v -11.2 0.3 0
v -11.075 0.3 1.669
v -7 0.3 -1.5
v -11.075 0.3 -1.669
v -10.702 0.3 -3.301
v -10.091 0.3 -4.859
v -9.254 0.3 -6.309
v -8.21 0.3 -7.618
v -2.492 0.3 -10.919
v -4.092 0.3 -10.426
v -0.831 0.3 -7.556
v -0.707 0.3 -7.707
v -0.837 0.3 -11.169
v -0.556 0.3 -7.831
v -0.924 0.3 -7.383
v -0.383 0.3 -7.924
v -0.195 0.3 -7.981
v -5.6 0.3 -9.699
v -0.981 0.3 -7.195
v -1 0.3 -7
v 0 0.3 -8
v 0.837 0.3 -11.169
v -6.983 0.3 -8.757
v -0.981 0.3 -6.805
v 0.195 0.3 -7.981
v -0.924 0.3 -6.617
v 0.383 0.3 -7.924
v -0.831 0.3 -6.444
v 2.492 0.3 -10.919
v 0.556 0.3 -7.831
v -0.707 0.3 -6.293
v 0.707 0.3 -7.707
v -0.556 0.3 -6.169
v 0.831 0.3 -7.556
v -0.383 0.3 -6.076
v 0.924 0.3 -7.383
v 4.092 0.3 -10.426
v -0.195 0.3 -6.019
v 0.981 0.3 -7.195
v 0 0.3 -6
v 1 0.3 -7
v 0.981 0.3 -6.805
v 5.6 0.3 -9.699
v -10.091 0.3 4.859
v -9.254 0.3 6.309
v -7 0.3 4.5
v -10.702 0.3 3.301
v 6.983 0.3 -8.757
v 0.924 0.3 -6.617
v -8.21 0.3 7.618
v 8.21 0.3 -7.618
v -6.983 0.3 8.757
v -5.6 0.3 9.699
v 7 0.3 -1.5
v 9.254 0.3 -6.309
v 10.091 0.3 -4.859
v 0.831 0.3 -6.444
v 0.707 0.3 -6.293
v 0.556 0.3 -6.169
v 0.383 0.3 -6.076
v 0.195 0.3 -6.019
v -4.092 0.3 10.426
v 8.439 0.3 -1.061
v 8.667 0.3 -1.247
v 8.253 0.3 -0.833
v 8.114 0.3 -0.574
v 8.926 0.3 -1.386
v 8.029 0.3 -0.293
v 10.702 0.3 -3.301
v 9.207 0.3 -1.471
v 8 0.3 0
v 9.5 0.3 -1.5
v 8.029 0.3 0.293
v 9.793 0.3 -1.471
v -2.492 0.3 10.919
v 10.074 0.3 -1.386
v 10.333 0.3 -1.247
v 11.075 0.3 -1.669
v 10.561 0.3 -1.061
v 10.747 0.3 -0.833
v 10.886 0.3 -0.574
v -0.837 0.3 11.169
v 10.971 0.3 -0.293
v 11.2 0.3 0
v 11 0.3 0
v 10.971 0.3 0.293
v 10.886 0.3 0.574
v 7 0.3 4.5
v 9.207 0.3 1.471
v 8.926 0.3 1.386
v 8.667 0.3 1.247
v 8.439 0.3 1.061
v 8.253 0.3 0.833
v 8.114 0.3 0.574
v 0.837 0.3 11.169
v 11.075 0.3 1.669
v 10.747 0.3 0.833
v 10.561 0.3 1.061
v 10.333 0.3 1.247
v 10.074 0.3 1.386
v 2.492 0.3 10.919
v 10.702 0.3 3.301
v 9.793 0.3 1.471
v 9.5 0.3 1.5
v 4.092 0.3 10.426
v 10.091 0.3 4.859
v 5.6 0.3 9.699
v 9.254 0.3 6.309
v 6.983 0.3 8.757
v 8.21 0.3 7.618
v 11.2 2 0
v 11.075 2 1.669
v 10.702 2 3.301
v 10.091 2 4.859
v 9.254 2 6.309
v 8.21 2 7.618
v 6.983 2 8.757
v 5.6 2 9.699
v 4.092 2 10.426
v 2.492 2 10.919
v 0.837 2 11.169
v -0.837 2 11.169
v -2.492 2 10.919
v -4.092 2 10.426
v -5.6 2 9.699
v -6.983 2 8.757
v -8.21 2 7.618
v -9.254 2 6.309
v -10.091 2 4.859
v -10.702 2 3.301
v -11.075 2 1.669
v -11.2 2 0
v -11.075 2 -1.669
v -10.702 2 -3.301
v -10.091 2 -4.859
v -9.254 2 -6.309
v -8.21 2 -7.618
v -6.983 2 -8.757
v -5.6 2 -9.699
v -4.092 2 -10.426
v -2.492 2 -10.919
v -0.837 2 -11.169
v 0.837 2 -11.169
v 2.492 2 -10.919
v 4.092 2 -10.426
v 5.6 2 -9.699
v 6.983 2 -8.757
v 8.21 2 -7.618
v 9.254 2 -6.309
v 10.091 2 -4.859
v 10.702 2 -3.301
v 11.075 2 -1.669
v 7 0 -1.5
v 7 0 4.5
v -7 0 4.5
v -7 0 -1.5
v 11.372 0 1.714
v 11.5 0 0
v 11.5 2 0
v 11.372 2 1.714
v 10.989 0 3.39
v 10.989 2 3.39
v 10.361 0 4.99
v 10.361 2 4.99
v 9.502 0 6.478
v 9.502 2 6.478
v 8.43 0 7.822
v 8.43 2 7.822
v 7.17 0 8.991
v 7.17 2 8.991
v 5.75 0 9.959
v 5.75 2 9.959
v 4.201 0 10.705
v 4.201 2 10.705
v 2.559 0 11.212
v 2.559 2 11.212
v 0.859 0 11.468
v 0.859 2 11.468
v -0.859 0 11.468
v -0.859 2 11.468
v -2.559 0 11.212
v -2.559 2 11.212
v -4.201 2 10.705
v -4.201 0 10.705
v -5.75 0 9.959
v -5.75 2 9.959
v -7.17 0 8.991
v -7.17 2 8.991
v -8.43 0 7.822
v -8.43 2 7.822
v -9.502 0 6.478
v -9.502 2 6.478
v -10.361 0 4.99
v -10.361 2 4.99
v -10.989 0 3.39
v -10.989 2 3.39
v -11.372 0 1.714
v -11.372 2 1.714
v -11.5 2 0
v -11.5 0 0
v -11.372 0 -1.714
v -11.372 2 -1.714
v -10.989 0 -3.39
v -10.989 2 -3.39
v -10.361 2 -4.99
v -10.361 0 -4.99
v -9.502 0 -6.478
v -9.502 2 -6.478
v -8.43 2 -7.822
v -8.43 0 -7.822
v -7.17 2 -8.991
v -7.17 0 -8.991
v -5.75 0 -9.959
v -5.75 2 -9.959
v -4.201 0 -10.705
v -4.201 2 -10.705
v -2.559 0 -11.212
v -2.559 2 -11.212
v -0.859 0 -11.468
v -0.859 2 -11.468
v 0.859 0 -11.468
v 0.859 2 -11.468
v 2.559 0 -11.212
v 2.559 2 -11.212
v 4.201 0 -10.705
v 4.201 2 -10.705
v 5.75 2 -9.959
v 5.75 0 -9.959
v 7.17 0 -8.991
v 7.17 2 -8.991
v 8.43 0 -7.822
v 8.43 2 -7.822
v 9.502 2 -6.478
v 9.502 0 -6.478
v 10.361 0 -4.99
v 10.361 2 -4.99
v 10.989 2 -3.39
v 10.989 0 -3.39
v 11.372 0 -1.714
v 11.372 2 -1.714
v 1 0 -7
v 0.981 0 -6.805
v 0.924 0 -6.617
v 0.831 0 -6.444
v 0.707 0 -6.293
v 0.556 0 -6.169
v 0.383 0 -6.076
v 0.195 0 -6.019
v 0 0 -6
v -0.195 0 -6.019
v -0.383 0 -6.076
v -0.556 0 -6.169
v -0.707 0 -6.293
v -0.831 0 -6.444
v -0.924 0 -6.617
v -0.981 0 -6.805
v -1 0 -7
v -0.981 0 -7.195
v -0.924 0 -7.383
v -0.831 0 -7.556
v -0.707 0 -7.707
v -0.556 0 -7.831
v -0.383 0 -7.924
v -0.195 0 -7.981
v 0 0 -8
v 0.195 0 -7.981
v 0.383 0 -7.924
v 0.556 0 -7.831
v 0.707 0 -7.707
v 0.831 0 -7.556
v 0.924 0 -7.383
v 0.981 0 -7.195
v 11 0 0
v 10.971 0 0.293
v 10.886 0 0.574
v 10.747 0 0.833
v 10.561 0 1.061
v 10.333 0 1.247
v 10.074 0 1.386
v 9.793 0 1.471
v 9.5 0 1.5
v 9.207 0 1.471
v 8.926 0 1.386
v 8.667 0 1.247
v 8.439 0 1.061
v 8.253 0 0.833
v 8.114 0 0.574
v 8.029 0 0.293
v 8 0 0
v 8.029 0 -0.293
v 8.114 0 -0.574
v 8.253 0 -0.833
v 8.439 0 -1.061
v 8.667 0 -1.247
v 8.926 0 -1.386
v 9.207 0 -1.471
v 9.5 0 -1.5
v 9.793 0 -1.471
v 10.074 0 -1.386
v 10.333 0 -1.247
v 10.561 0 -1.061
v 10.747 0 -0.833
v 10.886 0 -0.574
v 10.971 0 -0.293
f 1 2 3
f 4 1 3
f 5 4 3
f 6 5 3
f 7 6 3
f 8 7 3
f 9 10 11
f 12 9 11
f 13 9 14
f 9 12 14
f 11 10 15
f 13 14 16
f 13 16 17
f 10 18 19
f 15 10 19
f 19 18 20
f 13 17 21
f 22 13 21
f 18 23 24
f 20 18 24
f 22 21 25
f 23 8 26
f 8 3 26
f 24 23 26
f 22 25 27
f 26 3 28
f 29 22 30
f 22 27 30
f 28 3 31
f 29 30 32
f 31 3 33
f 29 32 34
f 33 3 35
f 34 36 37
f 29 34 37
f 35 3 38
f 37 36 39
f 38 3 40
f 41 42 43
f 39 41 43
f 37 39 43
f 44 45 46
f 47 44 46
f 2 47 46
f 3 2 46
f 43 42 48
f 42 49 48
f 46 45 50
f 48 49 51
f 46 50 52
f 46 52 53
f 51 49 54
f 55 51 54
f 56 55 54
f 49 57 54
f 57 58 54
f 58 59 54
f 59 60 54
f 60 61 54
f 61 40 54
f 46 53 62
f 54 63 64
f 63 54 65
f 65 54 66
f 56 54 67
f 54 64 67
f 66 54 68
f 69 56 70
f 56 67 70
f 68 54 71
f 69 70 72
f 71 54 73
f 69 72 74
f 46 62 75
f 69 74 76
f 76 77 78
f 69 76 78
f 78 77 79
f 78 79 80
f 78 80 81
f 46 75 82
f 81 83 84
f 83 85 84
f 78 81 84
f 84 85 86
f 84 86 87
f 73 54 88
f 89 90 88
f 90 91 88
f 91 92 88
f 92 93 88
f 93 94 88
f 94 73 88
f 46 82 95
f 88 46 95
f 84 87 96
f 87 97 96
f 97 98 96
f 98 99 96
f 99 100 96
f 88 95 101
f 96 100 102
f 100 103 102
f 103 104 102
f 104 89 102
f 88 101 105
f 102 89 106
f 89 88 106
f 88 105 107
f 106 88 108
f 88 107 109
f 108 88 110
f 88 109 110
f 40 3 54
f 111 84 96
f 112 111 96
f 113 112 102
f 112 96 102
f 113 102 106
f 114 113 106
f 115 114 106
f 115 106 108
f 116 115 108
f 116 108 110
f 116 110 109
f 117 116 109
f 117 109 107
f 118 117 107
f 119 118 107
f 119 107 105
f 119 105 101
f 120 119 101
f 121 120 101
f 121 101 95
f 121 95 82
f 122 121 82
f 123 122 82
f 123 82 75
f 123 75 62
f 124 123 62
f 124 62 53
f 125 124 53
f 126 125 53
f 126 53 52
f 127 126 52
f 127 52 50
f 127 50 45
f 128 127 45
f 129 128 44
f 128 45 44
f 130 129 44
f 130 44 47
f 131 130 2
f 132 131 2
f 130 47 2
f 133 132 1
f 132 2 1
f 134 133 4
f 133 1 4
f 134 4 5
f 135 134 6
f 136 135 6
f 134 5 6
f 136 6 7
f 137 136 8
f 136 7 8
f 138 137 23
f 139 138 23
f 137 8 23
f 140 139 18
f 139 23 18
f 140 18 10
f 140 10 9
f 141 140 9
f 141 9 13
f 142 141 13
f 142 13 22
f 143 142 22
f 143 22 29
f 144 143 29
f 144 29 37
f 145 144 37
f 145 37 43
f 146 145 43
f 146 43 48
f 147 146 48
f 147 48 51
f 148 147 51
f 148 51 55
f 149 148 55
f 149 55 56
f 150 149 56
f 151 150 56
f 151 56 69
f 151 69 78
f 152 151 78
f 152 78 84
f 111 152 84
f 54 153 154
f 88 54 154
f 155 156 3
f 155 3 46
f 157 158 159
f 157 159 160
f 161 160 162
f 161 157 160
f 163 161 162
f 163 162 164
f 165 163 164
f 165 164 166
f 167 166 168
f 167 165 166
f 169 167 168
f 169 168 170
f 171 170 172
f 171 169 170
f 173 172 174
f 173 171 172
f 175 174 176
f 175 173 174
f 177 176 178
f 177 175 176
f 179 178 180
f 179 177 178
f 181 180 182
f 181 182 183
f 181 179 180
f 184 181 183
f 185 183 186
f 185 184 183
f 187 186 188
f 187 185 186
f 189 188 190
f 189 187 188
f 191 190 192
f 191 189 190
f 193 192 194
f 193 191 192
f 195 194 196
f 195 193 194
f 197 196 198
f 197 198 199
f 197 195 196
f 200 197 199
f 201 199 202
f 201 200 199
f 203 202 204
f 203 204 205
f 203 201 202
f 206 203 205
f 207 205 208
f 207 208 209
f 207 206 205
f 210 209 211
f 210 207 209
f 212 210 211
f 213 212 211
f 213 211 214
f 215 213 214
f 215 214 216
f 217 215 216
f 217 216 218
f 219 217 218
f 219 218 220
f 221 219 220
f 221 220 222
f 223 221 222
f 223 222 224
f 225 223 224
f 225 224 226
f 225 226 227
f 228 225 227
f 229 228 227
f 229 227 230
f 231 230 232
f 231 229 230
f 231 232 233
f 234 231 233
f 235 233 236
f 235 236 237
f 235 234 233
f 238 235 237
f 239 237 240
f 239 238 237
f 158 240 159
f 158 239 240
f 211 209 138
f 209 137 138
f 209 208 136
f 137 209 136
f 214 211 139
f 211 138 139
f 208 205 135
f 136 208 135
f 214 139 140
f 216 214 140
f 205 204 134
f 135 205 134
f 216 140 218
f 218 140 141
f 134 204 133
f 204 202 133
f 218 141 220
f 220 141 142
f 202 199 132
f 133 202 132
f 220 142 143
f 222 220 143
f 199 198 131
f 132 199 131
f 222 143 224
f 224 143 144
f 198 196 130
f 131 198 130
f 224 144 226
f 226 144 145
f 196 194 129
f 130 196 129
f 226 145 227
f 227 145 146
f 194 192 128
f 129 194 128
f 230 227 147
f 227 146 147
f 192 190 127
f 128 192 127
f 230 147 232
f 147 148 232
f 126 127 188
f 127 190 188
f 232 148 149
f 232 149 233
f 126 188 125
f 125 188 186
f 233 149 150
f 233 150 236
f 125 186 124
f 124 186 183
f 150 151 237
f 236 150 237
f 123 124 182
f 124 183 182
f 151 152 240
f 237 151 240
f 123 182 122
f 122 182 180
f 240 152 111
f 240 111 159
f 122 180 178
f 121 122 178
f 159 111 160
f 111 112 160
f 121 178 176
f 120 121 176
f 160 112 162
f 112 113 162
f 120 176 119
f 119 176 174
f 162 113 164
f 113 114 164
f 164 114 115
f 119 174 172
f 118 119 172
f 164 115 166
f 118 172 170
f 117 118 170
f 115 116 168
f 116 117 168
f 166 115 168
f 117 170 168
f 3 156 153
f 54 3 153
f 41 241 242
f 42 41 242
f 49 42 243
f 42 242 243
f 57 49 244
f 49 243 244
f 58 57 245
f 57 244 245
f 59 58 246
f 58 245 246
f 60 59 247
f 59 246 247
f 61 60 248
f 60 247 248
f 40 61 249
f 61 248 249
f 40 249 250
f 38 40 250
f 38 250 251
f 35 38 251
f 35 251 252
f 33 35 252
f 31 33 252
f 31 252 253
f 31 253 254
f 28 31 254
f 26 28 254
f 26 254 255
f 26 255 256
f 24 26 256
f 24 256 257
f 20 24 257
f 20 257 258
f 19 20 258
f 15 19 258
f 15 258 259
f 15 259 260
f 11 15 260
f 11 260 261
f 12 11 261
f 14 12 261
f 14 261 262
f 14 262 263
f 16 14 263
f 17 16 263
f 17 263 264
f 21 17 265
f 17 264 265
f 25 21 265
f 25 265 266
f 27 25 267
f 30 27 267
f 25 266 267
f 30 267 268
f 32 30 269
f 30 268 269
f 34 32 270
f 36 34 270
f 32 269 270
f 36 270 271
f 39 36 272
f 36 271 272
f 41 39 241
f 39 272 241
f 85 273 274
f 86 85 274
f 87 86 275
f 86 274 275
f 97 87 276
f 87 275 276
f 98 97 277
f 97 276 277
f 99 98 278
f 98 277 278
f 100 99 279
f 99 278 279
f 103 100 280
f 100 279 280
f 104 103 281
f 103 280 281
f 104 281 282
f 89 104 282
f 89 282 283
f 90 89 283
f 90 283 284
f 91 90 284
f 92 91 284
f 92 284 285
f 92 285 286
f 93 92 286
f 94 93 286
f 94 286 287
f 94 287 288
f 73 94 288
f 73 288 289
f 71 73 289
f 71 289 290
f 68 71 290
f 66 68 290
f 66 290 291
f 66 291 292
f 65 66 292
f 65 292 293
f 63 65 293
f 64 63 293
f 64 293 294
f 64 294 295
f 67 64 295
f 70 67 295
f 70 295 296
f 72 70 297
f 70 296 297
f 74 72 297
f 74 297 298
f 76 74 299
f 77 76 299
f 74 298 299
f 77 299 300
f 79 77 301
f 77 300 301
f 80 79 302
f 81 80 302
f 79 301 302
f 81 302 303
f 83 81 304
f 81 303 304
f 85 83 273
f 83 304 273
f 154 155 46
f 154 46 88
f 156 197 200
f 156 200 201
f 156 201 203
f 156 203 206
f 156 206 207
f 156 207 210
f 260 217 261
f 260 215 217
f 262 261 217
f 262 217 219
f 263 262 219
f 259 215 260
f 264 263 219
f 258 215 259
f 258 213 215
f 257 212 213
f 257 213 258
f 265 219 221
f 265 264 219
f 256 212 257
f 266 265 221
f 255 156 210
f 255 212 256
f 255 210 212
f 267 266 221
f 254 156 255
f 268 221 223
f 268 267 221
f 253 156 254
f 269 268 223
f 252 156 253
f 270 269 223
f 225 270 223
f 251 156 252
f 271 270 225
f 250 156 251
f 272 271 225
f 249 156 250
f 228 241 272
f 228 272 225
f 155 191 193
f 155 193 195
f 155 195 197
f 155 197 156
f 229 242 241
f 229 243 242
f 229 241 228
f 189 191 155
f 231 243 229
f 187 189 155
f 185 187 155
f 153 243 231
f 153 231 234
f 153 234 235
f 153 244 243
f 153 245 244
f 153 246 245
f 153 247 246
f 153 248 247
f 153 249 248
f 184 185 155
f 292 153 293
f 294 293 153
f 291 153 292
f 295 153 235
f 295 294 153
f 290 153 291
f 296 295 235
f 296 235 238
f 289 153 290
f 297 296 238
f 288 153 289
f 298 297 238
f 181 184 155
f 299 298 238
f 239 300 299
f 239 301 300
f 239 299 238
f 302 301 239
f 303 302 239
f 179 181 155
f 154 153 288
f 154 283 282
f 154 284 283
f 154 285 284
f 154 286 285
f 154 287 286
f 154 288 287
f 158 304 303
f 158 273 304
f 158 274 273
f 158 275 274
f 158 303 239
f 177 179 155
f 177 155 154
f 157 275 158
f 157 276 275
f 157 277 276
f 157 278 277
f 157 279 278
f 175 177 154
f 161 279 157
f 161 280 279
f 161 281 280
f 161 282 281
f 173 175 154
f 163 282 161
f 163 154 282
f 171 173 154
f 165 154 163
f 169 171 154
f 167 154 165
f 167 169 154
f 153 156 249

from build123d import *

# Parameters (mm, degrees)
F0_R     = 11.5
F2_DEPTH = 2
F3_T     = -0.3
F1_W     = 14
F1_H     = 6
F1_R     = 1
F1_R_2   = 1.5
F4_DEPTH = 2.001


with BuildPart() as f2:
    # F0 (on Front) → F2 (new body)
    with BuildSketch(Plane.XZ):
        Circle(F0_R)
    extrude(amount=-F2_DEPTH)

    # F3
    f3_openings = [f2.faces().sort_by_distance(p)[0] for p in [
        (0, 2, 0),
    ]]
    offset(amount=F3_T, openings=f3_openings)

    # F1 (on Front) → F4 (cut, through all)
    with BuildSketch(Plane.XZ):
        with Locations((0, 1.5)):
            Rectangle(F1_W, F1_H)
        with Locations((0, -7)):
            Circle(F1_R)
        with Locations((9.5, 0)):
            Circle(F1_R_2)
    extrude(amount=-F4_DEPTH, mode=Mode.SUBTRACT)


solid = f2.part
